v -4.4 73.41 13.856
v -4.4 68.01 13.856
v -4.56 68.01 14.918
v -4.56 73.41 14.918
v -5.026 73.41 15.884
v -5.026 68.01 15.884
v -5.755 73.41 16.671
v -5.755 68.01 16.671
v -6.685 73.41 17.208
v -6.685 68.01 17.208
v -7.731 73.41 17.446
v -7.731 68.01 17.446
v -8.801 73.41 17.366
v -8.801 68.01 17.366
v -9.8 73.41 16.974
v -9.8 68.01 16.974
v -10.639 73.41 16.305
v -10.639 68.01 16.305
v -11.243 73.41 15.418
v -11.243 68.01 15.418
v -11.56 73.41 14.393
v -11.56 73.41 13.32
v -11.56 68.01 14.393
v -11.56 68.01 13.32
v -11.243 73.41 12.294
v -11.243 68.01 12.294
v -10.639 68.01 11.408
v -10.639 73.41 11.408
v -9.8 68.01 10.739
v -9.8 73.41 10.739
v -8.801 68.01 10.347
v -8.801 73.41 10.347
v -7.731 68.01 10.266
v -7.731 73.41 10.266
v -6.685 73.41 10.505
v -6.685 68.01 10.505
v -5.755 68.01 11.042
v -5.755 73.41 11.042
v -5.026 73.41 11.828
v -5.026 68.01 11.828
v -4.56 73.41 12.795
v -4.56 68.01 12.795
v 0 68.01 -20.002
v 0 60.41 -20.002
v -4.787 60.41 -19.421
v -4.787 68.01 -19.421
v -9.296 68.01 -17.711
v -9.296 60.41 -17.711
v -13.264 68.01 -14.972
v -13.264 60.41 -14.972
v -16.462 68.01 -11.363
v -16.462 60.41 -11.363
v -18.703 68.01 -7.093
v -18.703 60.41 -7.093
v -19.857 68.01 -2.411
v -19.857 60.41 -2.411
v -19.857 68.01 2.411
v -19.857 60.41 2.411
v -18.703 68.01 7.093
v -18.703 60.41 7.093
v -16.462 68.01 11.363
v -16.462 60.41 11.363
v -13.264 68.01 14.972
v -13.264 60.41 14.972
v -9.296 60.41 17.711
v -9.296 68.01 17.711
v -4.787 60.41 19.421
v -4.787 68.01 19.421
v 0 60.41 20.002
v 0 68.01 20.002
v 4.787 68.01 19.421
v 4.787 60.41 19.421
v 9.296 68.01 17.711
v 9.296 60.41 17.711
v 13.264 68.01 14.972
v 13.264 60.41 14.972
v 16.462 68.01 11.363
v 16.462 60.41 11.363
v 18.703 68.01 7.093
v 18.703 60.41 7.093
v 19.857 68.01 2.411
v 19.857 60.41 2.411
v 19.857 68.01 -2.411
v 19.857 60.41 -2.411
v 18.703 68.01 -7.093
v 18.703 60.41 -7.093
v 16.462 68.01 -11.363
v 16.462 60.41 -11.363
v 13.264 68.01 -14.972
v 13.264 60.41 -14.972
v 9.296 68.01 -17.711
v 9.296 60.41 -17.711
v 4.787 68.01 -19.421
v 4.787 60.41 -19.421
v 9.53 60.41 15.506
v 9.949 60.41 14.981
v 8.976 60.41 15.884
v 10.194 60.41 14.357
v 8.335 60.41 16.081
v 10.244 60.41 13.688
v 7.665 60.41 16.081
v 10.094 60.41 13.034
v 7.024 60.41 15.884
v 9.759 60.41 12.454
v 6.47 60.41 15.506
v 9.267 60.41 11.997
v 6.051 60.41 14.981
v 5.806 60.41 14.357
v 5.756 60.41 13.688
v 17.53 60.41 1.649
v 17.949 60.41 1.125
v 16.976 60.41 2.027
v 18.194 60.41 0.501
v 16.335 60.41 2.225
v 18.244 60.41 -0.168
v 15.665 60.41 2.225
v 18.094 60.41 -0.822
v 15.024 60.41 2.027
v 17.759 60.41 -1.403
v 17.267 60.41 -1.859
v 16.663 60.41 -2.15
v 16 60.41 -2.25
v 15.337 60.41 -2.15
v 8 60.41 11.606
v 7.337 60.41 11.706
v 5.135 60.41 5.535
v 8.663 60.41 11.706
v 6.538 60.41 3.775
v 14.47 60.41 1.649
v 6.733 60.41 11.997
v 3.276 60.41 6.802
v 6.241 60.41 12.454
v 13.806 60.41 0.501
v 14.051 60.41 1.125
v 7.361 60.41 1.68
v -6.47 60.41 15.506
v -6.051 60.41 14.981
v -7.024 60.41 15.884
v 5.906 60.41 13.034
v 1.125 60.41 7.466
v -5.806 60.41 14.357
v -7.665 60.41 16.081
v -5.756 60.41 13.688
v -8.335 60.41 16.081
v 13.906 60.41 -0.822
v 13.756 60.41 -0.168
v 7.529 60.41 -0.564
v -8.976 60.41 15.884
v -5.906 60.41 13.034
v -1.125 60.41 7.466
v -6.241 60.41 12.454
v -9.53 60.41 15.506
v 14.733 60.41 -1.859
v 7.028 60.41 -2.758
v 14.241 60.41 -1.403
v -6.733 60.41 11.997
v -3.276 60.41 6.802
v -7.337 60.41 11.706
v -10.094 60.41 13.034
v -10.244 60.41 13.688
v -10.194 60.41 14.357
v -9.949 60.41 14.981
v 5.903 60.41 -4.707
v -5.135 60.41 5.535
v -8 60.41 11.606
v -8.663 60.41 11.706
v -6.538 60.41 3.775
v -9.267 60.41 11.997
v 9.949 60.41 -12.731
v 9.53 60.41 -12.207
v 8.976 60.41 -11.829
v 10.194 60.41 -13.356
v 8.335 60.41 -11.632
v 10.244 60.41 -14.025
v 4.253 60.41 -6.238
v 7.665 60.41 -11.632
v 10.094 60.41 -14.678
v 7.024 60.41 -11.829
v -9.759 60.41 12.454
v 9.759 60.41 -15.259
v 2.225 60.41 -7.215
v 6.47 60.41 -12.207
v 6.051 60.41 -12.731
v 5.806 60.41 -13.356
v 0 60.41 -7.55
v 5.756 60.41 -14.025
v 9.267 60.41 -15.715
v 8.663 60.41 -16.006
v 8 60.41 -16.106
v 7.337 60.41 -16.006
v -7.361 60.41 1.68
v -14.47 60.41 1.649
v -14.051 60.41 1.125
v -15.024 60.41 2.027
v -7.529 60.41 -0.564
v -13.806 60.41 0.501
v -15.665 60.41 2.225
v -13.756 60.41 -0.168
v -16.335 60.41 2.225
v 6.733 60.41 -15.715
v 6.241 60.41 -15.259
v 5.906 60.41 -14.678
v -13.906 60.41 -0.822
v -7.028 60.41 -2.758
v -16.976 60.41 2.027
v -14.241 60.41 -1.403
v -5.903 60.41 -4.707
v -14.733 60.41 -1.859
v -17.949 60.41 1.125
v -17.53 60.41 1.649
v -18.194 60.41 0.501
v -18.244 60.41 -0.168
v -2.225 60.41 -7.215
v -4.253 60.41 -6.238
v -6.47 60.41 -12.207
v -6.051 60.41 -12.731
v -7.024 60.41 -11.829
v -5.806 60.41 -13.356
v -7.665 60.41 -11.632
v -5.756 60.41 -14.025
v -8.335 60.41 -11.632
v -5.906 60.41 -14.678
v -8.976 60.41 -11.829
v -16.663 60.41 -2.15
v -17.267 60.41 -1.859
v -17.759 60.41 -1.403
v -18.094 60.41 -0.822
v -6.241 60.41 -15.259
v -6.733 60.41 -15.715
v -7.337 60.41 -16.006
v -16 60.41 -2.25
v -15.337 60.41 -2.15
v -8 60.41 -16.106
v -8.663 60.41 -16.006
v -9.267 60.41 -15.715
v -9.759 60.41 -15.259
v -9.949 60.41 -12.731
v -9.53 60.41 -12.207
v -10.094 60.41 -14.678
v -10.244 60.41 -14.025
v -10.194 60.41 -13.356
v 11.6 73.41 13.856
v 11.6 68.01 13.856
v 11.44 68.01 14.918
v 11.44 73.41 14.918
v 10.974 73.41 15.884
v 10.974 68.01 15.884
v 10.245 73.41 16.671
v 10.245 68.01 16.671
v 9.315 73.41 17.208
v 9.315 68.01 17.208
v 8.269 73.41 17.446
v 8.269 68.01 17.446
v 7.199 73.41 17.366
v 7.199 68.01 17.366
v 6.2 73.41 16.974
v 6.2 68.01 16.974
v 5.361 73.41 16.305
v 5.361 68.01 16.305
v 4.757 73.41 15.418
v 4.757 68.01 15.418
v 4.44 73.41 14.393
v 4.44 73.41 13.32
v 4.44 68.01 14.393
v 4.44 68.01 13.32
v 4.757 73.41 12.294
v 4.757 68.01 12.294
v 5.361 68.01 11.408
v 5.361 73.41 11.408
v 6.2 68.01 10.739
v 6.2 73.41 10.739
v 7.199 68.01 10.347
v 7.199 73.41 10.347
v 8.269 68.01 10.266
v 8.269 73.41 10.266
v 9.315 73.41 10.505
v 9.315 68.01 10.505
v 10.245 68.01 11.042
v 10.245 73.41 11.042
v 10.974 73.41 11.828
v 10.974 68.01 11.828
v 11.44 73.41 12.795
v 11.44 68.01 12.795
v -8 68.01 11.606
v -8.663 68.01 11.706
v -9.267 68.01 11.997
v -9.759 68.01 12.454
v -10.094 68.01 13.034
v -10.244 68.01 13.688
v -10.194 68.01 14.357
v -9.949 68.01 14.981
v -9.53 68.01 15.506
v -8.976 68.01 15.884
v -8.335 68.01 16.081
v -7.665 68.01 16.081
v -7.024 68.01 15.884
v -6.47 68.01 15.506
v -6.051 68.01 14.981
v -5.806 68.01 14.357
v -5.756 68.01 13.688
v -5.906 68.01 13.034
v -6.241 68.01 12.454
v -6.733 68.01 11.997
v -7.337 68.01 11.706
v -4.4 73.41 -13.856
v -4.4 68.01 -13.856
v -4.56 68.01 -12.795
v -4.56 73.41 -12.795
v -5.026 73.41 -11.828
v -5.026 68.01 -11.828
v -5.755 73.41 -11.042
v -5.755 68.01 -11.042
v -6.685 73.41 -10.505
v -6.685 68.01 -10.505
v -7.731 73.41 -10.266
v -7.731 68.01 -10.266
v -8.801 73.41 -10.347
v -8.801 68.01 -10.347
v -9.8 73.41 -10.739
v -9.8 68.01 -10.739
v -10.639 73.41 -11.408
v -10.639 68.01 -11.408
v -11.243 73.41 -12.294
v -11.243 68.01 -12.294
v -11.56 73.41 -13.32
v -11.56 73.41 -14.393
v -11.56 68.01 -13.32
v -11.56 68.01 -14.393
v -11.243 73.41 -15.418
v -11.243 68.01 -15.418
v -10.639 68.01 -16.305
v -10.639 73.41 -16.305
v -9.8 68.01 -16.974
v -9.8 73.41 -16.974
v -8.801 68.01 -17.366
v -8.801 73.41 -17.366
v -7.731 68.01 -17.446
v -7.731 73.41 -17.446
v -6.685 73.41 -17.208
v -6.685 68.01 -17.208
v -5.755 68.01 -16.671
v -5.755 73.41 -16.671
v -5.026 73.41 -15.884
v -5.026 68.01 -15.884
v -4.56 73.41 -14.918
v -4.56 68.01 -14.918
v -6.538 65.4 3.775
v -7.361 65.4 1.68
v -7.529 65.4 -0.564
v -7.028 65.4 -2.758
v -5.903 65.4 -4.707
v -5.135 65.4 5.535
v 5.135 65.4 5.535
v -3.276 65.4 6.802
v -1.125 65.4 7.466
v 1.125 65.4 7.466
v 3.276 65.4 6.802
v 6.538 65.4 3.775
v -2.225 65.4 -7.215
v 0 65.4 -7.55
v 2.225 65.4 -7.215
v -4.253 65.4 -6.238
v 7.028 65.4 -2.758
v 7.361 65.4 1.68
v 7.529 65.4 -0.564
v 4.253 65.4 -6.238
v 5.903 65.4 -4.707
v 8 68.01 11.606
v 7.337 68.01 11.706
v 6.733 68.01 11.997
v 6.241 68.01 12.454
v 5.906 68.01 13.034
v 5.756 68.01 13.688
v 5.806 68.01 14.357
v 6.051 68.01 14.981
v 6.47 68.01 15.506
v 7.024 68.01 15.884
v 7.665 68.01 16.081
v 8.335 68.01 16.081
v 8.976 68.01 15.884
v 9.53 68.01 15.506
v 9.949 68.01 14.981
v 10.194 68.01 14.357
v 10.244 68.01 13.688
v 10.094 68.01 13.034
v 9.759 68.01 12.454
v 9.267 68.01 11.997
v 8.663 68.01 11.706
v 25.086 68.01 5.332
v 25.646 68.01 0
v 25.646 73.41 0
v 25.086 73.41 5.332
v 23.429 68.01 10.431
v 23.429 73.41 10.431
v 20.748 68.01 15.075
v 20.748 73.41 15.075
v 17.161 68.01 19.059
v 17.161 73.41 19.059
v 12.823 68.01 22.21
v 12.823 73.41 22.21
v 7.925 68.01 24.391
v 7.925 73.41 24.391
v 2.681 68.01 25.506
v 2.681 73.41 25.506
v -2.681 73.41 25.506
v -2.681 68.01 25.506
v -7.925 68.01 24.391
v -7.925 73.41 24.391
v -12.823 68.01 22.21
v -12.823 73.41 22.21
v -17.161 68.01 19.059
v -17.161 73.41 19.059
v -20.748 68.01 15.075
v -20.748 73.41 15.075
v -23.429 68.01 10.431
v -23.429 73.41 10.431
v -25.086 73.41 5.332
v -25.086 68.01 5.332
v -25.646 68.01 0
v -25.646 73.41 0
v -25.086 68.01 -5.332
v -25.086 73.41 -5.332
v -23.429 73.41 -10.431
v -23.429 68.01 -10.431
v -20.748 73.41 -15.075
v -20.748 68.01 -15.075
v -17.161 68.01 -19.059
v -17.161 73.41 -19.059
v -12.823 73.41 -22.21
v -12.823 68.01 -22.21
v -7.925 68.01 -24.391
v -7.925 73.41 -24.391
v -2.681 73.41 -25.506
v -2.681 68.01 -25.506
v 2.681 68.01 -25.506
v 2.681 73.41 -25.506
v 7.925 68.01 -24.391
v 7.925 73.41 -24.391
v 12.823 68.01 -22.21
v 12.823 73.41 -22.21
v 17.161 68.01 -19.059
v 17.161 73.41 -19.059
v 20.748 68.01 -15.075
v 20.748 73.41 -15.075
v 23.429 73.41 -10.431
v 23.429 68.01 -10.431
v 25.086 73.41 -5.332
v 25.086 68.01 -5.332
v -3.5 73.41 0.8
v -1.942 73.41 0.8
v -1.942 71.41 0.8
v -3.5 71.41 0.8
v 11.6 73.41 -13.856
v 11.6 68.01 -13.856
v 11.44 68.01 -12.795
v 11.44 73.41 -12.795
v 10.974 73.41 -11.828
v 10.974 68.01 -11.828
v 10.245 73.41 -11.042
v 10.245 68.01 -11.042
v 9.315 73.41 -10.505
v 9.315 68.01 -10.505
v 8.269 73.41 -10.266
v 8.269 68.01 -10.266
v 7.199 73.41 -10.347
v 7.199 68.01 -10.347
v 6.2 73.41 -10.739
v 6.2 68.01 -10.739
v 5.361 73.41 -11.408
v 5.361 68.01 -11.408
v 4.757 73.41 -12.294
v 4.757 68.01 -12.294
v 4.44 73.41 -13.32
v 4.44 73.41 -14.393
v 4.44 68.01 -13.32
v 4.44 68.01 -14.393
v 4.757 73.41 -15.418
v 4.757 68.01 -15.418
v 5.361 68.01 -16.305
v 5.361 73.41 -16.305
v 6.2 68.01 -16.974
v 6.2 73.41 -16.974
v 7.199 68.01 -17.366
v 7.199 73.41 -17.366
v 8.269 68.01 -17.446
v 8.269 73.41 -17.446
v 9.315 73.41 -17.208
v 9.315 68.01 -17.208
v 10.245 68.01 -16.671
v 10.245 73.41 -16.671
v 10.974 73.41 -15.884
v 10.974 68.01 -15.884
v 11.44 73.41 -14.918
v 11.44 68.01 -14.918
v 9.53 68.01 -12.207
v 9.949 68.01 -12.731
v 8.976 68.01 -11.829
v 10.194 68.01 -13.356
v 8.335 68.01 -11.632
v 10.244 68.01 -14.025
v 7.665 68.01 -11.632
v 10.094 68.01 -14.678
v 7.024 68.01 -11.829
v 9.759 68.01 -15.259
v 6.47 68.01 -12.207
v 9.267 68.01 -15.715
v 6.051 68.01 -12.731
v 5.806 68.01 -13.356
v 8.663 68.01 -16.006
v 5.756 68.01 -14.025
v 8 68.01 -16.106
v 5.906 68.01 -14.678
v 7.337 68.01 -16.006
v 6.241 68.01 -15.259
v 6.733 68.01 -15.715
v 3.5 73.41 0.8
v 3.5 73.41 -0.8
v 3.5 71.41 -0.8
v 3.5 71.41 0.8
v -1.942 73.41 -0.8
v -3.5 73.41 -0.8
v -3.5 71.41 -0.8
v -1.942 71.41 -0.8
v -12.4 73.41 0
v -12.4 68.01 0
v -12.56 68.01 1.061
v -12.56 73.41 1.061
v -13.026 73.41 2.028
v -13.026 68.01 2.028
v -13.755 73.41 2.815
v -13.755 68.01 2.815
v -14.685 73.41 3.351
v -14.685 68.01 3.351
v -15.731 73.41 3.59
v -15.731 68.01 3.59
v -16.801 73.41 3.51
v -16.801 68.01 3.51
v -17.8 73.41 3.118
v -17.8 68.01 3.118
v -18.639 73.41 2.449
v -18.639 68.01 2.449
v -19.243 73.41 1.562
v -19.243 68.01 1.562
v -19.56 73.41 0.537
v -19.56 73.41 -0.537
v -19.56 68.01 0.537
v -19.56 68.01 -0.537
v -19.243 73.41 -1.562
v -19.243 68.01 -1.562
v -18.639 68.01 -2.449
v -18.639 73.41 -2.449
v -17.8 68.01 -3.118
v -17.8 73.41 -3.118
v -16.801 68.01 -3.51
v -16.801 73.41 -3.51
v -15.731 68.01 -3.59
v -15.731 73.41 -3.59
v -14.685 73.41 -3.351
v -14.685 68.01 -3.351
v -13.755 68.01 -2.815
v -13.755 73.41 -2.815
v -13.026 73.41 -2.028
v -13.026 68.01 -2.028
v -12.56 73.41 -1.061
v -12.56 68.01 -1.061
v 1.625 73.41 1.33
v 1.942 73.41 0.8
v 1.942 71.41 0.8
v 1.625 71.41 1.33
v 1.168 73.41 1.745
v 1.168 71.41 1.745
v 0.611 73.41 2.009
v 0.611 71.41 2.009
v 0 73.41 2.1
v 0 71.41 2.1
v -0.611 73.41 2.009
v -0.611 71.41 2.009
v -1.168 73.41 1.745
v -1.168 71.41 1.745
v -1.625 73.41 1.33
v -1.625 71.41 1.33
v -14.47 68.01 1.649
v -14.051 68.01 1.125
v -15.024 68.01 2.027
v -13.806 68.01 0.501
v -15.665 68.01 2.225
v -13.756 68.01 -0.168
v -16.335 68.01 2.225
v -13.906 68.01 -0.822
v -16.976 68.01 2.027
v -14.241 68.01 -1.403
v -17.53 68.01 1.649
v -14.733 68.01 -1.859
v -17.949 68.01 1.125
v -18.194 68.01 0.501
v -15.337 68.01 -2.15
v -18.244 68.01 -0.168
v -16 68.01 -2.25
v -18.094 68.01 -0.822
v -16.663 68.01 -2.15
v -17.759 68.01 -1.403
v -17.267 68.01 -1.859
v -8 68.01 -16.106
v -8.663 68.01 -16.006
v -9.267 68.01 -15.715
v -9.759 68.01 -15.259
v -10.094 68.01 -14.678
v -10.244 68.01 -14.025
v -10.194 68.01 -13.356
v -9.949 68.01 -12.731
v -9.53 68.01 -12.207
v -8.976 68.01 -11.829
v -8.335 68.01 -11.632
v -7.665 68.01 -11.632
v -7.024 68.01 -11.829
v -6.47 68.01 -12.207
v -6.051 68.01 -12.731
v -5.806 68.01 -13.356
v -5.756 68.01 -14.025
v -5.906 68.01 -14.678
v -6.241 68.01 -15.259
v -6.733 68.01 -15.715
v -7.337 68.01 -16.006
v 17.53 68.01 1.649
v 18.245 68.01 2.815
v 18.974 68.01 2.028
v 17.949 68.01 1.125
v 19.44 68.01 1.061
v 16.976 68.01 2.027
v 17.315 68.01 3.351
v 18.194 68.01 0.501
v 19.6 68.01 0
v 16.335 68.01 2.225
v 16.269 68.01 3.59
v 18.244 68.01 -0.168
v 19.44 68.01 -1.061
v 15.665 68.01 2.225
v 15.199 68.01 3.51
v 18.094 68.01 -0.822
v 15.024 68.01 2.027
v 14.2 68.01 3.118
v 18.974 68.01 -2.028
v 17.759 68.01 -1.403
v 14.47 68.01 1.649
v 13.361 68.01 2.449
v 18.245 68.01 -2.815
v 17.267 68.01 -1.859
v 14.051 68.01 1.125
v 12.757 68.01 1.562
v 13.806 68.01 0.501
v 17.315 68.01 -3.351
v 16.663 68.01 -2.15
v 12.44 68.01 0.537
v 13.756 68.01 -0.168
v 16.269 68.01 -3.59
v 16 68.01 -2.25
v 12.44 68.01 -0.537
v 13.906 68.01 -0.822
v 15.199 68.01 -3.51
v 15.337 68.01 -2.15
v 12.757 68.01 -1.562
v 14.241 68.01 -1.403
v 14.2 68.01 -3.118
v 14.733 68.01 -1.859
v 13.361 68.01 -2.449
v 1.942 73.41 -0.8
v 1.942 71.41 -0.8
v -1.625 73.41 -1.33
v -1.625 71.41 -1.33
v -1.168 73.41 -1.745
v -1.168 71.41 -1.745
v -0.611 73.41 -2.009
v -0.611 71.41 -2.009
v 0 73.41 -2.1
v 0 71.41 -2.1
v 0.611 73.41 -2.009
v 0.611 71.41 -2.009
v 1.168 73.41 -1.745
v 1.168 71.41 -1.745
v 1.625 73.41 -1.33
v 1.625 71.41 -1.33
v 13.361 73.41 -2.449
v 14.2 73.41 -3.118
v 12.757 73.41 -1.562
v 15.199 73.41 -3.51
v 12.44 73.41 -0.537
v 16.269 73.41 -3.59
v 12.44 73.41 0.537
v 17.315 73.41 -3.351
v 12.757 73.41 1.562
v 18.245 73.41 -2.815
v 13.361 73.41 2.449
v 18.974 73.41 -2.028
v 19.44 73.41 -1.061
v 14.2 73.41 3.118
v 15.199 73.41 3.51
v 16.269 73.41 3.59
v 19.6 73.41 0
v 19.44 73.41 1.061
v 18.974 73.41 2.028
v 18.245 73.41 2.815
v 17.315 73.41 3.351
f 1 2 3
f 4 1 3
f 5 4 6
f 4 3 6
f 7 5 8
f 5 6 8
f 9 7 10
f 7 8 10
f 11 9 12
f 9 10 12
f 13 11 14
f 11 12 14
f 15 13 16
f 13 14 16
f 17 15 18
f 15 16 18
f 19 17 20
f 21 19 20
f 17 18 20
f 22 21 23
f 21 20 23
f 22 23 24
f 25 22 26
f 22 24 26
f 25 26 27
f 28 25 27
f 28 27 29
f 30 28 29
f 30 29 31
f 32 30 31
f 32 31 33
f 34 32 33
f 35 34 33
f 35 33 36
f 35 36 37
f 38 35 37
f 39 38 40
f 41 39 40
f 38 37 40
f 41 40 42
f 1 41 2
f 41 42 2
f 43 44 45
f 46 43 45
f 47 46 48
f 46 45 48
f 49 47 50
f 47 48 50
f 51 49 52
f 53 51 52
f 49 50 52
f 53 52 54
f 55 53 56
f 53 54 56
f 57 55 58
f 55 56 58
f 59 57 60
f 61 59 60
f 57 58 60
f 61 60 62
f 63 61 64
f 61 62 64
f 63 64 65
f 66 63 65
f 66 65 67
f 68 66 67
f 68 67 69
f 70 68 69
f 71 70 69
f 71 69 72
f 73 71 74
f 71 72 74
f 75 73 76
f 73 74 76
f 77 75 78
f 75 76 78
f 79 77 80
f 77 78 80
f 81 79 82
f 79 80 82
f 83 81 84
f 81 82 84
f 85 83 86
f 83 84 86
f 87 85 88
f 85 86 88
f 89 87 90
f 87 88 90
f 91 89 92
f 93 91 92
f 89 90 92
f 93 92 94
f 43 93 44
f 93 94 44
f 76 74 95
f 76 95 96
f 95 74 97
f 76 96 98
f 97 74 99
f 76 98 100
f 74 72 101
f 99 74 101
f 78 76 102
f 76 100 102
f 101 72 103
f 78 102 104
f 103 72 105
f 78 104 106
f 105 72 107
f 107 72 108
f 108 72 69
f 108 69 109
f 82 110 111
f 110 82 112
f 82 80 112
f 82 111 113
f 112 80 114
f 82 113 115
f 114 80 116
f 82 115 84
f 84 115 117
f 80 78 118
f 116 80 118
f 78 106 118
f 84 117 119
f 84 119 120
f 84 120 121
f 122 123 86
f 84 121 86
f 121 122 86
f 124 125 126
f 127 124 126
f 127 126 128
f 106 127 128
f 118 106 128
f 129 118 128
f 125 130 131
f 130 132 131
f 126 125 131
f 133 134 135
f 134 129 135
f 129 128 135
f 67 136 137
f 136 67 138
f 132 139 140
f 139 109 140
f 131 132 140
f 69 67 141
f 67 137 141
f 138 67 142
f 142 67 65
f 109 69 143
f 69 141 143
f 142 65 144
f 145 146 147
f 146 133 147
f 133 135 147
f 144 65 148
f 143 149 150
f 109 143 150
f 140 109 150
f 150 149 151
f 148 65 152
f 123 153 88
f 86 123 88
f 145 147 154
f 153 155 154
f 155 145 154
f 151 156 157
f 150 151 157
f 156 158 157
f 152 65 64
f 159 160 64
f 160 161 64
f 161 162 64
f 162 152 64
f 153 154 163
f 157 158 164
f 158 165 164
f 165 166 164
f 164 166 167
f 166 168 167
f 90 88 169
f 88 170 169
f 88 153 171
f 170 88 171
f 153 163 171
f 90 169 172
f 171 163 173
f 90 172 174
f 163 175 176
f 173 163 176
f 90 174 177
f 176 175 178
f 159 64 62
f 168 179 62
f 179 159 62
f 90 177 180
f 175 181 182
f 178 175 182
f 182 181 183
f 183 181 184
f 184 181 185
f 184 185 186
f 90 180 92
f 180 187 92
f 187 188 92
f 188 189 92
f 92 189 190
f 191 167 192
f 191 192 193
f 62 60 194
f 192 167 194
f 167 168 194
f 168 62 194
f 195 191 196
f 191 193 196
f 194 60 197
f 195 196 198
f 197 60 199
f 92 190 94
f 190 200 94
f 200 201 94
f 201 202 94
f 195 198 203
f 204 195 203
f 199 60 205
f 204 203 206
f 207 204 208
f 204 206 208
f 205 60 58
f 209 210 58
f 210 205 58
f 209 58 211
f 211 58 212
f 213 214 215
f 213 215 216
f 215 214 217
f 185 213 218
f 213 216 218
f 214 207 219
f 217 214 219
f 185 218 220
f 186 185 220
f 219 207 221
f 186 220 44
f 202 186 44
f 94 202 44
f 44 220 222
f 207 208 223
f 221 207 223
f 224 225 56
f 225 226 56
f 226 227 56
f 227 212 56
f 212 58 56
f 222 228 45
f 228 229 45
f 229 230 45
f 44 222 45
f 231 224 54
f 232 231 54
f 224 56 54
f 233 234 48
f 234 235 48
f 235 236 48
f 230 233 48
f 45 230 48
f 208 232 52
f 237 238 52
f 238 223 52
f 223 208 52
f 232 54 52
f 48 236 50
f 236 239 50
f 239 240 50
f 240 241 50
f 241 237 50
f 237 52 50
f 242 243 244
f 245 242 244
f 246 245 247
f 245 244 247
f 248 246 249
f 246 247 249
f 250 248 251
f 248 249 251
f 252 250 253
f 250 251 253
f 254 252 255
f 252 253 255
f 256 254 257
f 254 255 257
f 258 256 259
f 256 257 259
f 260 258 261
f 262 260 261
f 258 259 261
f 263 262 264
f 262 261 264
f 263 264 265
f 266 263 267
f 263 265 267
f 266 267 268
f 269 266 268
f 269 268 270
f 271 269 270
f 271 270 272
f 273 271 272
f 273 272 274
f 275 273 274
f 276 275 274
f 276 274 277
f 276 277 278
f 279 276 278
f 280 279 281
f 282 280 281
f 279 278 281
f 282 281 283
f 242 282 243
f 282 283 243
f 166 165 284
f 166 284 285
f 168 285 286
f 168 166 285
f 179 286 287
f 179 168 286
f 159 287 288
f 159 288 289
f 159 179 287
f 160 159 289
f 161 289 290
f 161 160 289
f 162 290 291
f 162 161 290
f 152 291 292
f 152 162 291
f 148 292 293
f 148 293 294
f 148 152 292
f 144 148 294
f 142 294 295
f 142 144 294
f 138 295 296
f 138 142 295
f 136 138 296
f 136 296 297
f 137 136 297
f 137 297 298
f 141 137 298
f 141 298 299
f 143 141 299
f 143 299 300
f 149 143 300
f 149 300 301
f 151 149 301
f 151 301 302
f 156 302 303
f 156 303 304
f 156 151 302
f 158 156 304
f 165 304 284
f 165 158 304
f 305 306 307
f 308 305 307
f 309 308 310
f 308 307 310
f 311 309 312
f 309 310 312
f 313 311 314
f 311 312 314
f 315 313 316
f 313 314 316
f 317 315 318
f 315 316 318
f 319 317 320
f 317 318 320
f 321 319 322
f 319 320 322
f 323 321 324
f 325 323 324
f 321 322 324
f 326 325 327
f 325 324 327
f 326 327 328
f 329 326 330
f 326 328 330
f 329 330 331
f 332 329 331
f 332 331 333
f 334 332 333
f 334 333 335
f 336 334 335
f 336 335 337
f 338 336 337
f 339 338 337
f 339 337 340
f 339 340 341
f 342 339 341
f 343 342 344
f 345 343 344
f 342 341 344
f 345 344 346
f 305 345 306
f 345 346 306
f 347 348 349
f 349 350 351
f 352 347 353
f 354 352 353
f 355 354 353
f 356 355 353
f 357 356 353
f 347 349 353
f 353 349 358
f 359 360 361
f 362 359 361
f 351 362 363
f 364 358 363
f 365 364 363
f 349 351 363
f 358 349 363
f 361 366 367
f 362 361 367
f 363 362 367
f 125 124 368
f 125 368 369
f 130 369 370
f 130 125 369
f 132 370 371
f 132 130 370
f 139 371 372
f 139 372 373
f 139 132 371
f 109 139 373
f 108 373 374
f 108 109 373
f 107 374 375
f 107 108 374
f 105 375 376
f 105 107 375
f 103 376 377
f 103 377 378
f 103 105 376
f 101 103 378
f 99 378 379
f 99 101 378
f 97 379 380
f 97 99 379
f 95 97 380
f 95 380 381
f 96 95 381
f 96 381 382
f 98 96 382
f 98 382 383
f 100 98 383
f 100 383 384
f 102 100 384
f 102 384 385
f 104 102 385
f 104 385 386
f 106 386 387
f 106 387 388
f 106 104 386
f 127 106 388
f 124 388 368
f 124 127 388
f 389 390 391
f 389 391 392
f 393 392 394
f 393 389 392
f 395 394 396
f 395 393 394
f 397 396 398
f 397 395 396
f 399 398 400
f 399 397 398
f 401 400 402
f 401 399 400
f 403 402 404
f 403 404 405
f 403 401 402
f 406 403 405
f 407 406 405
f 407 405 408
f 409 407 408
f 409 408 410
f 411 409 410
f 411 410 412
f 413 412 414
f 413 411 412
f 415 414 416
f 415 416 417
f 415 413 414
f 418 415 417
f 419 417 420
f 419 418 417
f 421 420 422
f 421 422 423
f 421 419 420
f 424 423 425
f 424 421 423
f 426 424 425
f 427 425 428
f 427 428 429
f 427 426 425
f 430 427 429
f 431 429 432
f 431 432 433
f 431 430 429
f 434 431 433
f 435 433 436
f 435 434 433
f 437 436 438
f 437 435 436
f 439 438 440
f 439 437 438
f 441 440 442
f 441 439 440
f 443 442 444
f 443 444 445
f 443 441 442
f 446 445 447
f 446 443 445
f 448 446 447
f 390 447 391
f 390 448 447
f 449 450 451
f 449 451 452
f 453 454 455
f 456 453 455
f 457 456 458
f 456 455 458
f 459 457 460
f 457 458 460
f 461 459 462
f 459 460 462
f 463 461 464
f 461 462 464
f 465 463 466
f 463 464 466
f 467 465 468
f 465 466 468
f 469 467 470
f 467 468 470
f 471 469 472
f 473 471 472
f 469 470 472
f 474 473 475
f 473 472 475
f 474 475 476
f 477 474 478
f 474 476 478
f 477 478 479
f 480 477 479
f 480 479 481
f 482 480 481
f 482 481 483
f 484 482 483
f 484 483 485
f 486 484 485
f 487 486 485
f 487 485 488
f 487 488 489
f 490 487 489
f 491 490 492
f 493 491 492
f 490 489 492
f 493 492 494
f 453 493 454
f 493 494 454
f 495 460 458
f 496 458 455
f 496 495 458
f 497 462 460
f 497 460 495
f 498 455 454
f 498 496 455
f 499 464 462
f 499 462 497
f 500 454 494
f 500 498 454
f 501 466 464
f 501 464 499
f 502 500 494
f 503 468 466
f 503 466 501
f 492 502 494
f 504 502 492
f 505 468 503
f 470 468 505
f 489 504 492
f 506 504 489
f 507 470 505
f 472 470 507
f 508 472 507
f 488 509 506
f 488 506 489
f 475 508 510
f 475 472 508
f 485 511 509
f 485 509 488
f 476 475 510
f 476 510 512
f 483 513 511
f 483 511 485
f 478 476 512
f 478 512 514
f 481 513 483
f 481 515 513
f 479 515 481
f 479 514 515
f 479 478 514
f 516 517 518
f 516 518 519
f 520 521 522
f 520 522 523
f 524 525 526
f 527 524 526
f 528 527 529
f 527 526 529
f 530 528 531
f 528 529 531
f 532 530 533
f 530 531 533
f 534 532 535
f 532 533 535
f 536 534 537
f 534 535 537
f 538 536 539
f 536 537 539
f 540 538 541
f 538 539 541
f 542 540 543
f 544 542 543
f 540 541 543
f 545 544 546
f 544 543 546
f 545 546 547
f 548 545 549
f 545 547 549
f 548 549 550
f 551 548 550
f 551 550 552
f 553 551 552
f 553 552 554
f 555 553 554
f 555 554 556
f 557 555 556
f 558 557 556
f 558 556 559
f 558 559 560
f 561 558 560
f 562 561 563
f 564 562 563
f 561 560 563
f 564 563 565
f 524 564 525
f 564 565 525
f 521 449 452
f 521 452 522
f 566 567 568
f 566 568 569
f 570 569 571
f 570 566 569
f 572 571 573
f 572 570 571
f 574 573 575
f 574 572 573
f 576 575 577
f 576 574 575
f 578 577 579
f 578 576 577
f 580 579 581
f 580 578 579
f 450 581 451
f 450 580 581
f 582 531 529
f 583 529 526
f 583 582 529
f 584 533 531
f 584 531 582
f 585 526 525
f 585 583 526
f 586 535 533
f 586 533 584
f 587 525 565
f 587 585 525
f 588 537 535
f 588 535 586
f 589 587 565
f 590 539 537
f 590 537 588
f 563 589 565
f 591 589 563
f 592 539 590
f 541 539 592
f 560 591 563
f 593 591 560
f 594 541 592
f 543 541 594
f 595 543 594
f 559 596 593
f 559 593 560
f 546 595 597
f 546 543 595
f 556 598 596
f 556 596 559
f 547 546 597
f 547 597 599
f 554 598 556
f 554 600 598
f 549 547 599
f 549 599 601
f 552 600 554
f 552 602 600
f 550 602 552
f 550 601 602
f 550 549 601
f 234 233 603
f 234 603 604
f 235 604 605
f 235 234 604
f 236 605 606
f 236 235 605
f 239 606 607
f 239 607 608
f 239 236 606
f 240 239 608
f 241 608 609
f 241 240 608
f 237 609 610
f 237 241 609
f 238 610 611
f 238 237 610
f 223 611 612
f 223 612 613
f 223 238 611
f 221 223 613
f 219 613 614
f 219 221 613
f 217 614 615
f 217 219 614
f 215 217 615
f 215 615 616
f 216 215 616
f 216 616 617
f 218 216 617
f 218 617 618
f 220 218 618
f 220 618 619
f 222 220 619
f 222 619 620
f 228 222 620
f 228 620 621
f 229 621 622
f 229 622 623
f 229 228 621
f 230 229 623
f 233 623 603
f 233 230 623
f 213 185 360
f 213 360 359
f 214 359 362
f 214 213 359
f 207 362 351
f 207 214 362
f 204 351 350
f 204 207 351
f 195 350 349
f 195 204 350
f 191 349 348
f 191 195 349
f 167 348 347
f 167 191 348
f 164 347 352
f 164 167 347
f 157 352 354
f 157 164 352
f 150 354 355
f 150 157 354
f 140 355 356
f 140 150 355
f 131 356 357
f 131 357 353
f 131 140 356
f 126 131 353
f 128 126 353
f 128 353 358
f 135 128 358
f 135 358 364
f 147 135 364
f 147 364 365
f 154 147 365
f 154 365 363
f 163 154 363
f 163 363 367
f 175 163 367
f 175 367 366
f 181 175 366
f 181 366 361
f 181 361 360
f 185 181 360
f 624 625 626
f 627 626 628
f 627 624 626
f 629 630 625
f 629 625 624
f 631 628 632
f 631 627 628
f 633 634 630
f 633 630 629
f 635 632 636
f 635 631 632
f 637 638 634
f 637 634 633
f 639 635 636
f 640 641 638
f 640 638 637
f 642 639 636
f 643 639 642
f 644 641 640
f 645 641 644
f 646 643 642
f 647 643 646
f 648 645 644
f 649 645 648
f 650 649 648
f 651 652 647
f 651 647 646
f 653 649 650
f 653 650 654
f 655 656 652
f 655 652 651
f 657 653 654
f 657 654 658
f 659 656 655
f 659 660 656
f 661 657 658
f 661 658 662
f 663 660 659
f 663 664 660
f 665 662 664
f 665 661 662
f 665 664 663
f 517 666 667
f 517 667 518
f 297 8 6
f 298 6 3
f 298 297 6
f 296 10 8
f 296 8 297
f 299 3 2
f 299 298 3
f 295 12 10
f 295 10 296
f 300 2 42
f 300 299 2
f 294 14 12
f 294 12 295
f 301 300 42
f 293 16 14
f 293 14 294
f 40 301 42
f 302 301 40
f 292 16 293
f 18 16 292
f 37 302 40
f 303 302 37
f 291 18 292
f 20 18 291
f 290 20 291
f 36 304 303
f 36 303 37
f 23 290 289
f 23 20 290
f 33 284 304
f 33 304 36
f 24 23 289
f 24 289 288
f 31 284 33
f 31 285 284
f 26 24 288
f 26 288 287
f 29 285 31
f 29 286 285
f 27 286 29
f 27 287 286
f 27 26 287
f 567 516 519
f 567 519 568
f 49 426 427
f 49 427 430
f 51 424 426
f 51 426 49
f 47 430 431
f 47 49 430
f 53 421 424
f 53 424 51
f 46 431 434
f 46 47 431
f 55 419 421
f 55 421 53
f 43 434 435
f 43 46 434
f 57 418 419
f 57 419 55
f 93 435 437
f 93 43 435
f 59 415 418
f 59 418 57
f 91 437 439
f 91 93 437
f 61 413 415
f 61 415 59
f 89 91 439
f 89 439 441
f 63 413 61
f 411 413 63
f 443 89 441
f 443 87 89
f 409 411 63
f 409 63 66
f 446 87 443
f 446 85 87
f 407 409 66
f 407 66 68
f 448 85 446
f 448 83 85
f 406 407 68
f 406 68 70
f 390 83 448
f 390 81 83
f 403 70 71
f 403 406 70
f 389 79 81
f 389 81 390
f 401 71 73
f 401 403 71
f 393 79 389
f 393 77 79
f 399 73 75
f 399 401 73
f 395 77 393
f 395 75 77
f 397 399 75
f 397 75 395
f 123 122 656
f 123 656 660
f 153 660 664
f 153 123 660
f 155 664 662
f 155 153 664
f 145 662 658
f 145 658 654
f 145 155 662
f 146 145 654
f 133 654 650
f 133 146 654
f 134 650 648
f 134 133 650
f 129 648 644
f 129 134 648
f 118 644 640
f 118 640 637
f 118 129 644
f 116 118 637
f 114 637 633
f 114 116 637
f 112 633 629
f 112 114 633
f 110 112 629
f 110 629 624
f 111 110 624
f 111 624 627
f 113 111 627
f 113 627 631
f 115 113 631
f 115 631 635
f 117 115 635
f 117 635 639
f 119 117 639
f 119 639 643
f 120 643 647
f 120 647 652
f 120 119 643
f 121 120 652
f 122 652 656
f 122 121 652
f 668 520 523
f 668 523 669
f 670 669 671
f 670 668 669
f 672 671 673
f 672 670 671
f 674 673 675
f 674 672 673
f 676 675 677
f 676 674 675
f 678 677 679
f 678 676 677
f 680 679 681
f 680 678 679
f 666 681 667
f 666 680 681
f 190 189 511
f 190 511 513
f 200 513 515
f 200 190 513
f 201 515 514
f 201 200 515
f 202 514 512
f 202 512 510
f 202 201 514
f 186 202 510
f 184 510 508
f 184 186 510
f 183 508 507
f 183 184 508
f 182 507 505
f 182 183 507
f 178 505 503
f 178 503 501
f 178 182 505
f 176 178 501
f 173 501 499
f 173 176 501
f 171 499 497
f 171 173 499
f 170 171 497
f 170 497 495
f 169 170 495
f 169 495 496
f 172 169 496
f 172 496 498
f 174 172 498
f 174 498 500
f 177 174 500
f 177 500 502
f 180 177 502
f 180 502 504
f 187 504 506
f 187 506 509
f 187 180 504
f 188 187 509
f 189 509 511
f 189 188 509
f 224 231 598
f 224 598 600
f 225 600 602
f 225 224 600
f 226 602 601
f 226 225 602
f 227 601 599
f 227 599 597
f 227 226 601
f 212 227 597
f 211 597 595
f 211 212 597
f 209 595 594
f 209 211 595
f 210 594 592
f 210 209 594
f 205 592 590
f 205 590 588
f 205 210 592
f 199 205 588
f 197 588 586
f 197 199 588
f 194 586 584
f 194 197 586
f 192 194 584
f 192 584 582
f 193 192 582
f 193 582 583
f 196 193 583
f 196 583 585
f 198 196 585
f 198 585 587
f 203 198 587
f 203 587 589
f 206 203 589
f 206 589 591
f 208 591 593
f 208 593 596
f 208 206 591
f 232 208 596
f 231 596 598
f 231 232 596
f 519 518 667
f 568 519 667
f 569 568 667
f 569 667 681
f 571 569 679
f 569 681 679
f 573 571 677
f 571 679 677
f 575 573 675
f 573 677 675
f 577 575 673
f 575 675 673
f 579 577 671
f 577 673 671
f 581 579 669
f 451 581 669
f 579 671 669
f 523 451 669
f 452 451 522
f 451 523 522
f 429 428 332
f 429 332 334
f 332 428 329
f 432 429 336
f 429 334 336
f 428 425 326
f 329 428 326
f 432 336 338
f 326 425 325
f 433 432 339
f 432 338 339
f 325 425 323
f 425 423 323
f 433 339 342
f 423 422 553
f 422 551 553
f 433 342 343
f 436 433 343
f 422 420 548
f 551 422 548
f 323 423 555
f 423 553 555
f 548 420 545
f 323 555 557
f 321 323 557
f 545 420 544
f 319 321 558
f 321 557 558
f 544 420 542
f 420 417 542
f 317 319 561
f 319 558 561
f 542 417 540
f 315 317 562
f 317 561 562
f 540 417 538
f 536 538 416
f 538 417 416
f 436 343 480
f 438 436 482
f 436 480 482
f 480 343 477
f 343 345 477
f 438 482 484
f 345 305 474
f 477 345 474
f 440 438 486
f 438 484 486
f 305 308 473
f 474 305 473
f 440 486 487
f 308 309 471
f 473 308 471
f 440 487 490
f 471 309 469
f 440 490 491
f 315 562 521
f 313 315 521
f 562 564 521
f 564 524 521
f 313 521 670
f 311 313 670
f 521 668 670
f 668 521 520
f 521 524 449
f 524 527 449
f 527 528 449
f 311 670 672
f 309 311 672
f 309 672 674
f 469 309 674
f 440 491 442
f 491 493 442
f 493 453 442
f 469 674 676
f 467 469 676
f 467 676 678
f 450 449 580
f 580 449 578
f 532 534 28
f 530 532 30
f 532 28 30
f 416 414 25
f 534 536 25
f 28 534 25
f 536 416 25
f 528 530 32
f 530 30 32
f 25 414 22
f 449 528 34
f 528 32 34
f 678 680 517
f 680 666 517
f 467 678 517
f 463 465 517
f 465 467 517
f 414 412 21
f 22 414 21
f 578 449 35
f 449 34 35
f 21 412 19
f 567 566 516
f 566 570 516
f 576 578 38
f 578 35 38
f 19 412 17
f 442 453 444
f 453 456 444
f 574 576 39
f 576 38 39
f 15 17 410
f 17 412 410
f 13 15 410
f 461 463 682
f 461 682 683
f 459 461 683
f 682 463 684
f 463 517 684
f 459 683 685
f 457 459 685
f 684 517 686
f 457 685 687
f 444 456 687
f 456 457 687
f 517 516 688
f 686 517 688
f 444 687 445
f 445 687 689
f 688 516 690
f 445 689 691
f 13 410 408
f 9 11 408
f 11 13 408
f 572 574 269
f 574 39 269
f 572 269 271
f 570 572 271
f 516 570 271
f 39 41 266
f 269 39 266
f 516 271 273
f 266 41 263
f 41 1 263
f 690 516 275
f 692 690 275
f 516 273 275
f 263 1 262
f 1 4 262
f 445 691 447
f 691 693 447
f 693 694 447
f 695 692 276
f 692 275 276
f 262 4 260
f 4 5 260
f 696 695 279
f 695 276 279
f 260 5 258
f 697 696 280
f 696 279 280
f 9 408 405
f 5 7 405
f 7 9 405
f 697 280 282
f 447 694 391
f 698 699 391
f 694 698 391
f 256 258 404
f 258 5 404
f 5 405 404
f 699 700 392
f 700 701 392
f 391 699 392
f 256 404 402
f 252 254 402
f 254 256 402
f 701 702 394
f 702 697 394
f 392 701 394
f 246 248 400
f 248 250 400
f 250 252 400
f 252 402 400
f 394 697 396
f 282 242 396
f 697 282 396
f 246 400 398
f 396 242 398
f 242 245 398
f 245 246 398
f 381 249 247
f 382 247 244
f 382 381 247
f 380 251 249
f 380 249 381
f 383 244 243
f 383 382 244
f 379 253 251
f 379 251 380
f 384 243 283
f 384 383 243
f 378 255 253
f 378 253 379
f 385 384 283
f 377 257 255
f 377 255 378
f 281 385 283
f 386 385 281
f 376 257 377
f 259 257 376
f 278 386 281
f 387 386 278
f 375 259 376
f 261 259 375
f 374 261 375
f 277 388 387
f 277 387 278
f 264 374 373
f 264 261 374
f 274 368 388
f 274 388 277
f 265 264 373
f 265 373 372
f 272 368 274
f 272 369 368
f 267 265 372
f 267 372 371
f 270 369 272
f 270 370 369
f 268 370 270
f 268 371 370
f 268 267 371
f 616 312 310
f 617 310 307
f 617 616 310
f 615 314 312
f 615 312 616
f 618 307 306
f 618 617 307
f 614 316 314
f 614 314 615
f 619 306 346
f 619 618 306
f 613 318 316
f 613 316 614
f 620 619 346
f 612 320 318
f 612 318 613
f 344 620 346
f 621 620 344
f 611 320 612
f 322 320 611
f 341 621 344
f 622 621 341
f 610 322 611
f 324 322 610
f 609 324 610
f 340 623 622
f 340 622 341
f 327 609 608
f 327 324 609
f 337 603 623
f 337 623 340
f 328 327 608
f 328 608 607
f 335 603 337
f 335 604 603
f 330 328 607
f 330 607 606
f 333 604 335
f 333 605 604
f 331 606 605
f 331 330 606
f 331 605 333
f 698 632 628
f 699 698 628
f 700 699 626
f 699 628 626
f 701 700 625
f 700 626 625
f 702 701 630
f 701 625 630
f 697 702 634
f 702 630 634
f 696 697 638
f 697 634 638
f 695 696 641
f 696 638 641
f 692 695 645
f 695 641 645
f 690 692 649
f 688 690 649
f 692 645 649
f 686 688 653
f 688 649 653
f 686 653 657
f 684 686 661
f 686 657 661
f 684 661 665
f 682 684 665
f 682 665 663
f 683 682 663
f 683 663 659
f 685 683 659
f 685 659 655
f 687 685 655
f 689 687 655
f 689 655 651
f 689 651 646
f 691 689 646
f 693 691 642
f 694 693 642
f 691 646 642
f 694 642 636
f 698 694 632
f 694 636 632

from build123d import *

# Parameters (mm, degrees)
SKETCH1_R           = 20.0025
SKETCH1_R_2         = 7.55
SKETCH1_R_3         = 2.25
BOSS_EXTRUDE1_DEPTH = 7.6
SKETCH9_R           = 7.55
SKETCH9_R_2         = 6.952615
BOSS_EXTRUDE5_DEPTH = 2.6104
SKETCH2_R           = 25.64638
SKETCH2_R_2         = 3.6
BOSS_EXTRUDE2_DEPTH = 5.4
CUT_EXTRUDE1_START  = 8
SKETCH4_R           = 6.952615
CUT_EXTRUDE1_DEPTH  = 8
BOSS_EXTRUDE6_START = -8.0104
SKETCH10_R          = 6.952615
BOSS_EXTRUDE6_DEPTH = 8.0104
CUT_EXTRUDE2_DEPTH  = 2


with BuildPart() as part:
    # Sketch1 → Boss-Extrude1 (new body)
    with BuildSketch(Plane(origin=(0, 60.4104, 0), x_dir=(1, 0, 0), z_dir=(0, 1, 0))):
        with Locations(Location((0, 0, 0), (0, 0, 90))):
            Circle(SKETCH1_R)
        with Locations(Location((0, 0, 0), (0, 0, 90))):
            Circle(SKETCH1_R_2, mode=Mode.SUBTRACT)
        with Locations(Location((-8, 13.856406461, 0), (0, 0, 90))):
            Circle(SKETCH1_R_3, mode=Mode.SUBTRACT)
        with Locations(Location((8, 13.856406461, 0), (0, 0, 90))):
            Circle(SKETCH1_R_3, mode=Mode.SUBTRACT)
        with Locations(Location((16, 0, 0), (0, 0, 90))):
            Circle(SKETCH1_R_3, mode=Mode.SUBTRACT)
        with Locations(Location((8, -13.856406461, 0), (0, 0, 90))):
            Circle(SKETCH1_R_3, mode=Mode.SUBTRACT)
        with Locations(Location((-8, -13.856406461, 0), (0, 0, 90))):
            Circle(SKETCH1_R_3, mode=Mode.SUBTRACT)
        with Locations(Location((-16, 0, 0), (0, 0, 90))):
            Circle(SKETCH1_R_3, mode=Mode.SUBTRACT)
    extrude(amount=BOSS_EXTRUDE1_DEPTH)

    # Sketch9 → Boss-Extrude5 (add)
    with BuildSketch(Plane(origin=(0, 65.4, 0), x_dir=(1, 0, 0), z_dir=(0, 1, 0))):
        with Locations(Location((0, 0, 0), (0, 0, 90))):
            Circle(SKETCH9_R)
        with Locations(Location((0, 0, 0), (0, 0, 270))):
            Circle(SKETCH9_R_2, mode=Mode.SUBTRACT)
    extrude(amount=BOSS_EXTRUDE5_DEPTH)

    # Sketch2 → Boss-Extrude2 (add)
    with BuildSketch(Plane(origin=(0, 68.0104, 0), x_dir=(-1, 0, 0), z_dir=(0, -1, 0))):
        with Locations(Location((0, 0, 0), (0, 0, 180))):
            Circle(SKETCH2_R)
        with Locations(Location((-16, 0, 0), (0, 0, 180))):
            Circle(SKETCH2_R_2, mode=Mode.SUBTRACT)
        with Locations(Location((-8, 13.856406461, 0), (0, 0, 180))):
            Circle(SKETCH2_R_2, mode=Mode.SUBTRACT)
        with Locations(Location((8, 13.856406461, 0), (0, 0, 180))):
            Circle(SKETCH2_R_2, mode=Mode.SUBTRACT)
        with Locations(Location((16, 0, 0), (0, 0, 180))):
            Circle(SKETCH2_R_2, mode=Mode.SUBTRACT)
        with Locations(Location((8, -13.856406461, 0), (0, 0, 180))):
            Circle(SKETCH2_R_2, mode=Mode.SUBTRACT)
        with Locations(Location((-8, -13.856406461, 0), (0, 0, 180))):
            Circle(SKETCH2_R_2, mode=Mode.SUBTRACT)
    extrude(amount=-BOSS_EXTRUDE2_DEPTH)

    # Sketch4 → Cut-Extrude1 (cut)
    with BuildSketch(Plane.XZ.offset(-73.4104).offset(CUT_EXTRUDE1_START)):
        Circle(SKETCH4_R)
    extrude(amount=-CUT_EXTRUDE1_DEPTH, mode=Mode.SUBTRACT)

    # Sketch10 → Boss-Extrude6 (add)
    with BuildSketch(Plane(origin=(0, 73.4104, 0), x_dir=(1, 0, 0), z_dir=(0, 1, 0)).offset(BOSS_EXTRUDE6_START)):
        Circle(SKETCH10_R)
    extrude(amount=BOSS_EXTRUDE6_DEPTH)

    # Sketch11 → Cut-Extrude2 (cut)
    with BuildSketch(Plane(origin=(0, 73.4104, 0), x_dir=(1, 0, 0), z_dir=(0, 1, 0))):
        with BuildLine():
            Line((1.941648784, 0.8), (3.5, 0.8))
            Line((3.5, 0.8), (3.5, -0.8))
            Line((3.5, -0.8), (1.941648784, -0.8))
            ThreePointArc((1.941648784, -0.8), (0, -2.1), (-1.941648784, -0.8))
            Line((-1.941648784, -0.8), (-3.5, -0.8))
            Line((-3.5, -0.8), (-3.5, 0.8))
            Line((-3.5, 0.8), (-1.941648784, 0.8))
            ThreePointArc((-1.941648784, 0.8), (0, 2.1), (1.941648784, 0.8))
        make_face()
    extrude(amount=-CUT_EXTRUDE2_DEPTH, mode=Mode.SUBTRACT)


solid = part.part
